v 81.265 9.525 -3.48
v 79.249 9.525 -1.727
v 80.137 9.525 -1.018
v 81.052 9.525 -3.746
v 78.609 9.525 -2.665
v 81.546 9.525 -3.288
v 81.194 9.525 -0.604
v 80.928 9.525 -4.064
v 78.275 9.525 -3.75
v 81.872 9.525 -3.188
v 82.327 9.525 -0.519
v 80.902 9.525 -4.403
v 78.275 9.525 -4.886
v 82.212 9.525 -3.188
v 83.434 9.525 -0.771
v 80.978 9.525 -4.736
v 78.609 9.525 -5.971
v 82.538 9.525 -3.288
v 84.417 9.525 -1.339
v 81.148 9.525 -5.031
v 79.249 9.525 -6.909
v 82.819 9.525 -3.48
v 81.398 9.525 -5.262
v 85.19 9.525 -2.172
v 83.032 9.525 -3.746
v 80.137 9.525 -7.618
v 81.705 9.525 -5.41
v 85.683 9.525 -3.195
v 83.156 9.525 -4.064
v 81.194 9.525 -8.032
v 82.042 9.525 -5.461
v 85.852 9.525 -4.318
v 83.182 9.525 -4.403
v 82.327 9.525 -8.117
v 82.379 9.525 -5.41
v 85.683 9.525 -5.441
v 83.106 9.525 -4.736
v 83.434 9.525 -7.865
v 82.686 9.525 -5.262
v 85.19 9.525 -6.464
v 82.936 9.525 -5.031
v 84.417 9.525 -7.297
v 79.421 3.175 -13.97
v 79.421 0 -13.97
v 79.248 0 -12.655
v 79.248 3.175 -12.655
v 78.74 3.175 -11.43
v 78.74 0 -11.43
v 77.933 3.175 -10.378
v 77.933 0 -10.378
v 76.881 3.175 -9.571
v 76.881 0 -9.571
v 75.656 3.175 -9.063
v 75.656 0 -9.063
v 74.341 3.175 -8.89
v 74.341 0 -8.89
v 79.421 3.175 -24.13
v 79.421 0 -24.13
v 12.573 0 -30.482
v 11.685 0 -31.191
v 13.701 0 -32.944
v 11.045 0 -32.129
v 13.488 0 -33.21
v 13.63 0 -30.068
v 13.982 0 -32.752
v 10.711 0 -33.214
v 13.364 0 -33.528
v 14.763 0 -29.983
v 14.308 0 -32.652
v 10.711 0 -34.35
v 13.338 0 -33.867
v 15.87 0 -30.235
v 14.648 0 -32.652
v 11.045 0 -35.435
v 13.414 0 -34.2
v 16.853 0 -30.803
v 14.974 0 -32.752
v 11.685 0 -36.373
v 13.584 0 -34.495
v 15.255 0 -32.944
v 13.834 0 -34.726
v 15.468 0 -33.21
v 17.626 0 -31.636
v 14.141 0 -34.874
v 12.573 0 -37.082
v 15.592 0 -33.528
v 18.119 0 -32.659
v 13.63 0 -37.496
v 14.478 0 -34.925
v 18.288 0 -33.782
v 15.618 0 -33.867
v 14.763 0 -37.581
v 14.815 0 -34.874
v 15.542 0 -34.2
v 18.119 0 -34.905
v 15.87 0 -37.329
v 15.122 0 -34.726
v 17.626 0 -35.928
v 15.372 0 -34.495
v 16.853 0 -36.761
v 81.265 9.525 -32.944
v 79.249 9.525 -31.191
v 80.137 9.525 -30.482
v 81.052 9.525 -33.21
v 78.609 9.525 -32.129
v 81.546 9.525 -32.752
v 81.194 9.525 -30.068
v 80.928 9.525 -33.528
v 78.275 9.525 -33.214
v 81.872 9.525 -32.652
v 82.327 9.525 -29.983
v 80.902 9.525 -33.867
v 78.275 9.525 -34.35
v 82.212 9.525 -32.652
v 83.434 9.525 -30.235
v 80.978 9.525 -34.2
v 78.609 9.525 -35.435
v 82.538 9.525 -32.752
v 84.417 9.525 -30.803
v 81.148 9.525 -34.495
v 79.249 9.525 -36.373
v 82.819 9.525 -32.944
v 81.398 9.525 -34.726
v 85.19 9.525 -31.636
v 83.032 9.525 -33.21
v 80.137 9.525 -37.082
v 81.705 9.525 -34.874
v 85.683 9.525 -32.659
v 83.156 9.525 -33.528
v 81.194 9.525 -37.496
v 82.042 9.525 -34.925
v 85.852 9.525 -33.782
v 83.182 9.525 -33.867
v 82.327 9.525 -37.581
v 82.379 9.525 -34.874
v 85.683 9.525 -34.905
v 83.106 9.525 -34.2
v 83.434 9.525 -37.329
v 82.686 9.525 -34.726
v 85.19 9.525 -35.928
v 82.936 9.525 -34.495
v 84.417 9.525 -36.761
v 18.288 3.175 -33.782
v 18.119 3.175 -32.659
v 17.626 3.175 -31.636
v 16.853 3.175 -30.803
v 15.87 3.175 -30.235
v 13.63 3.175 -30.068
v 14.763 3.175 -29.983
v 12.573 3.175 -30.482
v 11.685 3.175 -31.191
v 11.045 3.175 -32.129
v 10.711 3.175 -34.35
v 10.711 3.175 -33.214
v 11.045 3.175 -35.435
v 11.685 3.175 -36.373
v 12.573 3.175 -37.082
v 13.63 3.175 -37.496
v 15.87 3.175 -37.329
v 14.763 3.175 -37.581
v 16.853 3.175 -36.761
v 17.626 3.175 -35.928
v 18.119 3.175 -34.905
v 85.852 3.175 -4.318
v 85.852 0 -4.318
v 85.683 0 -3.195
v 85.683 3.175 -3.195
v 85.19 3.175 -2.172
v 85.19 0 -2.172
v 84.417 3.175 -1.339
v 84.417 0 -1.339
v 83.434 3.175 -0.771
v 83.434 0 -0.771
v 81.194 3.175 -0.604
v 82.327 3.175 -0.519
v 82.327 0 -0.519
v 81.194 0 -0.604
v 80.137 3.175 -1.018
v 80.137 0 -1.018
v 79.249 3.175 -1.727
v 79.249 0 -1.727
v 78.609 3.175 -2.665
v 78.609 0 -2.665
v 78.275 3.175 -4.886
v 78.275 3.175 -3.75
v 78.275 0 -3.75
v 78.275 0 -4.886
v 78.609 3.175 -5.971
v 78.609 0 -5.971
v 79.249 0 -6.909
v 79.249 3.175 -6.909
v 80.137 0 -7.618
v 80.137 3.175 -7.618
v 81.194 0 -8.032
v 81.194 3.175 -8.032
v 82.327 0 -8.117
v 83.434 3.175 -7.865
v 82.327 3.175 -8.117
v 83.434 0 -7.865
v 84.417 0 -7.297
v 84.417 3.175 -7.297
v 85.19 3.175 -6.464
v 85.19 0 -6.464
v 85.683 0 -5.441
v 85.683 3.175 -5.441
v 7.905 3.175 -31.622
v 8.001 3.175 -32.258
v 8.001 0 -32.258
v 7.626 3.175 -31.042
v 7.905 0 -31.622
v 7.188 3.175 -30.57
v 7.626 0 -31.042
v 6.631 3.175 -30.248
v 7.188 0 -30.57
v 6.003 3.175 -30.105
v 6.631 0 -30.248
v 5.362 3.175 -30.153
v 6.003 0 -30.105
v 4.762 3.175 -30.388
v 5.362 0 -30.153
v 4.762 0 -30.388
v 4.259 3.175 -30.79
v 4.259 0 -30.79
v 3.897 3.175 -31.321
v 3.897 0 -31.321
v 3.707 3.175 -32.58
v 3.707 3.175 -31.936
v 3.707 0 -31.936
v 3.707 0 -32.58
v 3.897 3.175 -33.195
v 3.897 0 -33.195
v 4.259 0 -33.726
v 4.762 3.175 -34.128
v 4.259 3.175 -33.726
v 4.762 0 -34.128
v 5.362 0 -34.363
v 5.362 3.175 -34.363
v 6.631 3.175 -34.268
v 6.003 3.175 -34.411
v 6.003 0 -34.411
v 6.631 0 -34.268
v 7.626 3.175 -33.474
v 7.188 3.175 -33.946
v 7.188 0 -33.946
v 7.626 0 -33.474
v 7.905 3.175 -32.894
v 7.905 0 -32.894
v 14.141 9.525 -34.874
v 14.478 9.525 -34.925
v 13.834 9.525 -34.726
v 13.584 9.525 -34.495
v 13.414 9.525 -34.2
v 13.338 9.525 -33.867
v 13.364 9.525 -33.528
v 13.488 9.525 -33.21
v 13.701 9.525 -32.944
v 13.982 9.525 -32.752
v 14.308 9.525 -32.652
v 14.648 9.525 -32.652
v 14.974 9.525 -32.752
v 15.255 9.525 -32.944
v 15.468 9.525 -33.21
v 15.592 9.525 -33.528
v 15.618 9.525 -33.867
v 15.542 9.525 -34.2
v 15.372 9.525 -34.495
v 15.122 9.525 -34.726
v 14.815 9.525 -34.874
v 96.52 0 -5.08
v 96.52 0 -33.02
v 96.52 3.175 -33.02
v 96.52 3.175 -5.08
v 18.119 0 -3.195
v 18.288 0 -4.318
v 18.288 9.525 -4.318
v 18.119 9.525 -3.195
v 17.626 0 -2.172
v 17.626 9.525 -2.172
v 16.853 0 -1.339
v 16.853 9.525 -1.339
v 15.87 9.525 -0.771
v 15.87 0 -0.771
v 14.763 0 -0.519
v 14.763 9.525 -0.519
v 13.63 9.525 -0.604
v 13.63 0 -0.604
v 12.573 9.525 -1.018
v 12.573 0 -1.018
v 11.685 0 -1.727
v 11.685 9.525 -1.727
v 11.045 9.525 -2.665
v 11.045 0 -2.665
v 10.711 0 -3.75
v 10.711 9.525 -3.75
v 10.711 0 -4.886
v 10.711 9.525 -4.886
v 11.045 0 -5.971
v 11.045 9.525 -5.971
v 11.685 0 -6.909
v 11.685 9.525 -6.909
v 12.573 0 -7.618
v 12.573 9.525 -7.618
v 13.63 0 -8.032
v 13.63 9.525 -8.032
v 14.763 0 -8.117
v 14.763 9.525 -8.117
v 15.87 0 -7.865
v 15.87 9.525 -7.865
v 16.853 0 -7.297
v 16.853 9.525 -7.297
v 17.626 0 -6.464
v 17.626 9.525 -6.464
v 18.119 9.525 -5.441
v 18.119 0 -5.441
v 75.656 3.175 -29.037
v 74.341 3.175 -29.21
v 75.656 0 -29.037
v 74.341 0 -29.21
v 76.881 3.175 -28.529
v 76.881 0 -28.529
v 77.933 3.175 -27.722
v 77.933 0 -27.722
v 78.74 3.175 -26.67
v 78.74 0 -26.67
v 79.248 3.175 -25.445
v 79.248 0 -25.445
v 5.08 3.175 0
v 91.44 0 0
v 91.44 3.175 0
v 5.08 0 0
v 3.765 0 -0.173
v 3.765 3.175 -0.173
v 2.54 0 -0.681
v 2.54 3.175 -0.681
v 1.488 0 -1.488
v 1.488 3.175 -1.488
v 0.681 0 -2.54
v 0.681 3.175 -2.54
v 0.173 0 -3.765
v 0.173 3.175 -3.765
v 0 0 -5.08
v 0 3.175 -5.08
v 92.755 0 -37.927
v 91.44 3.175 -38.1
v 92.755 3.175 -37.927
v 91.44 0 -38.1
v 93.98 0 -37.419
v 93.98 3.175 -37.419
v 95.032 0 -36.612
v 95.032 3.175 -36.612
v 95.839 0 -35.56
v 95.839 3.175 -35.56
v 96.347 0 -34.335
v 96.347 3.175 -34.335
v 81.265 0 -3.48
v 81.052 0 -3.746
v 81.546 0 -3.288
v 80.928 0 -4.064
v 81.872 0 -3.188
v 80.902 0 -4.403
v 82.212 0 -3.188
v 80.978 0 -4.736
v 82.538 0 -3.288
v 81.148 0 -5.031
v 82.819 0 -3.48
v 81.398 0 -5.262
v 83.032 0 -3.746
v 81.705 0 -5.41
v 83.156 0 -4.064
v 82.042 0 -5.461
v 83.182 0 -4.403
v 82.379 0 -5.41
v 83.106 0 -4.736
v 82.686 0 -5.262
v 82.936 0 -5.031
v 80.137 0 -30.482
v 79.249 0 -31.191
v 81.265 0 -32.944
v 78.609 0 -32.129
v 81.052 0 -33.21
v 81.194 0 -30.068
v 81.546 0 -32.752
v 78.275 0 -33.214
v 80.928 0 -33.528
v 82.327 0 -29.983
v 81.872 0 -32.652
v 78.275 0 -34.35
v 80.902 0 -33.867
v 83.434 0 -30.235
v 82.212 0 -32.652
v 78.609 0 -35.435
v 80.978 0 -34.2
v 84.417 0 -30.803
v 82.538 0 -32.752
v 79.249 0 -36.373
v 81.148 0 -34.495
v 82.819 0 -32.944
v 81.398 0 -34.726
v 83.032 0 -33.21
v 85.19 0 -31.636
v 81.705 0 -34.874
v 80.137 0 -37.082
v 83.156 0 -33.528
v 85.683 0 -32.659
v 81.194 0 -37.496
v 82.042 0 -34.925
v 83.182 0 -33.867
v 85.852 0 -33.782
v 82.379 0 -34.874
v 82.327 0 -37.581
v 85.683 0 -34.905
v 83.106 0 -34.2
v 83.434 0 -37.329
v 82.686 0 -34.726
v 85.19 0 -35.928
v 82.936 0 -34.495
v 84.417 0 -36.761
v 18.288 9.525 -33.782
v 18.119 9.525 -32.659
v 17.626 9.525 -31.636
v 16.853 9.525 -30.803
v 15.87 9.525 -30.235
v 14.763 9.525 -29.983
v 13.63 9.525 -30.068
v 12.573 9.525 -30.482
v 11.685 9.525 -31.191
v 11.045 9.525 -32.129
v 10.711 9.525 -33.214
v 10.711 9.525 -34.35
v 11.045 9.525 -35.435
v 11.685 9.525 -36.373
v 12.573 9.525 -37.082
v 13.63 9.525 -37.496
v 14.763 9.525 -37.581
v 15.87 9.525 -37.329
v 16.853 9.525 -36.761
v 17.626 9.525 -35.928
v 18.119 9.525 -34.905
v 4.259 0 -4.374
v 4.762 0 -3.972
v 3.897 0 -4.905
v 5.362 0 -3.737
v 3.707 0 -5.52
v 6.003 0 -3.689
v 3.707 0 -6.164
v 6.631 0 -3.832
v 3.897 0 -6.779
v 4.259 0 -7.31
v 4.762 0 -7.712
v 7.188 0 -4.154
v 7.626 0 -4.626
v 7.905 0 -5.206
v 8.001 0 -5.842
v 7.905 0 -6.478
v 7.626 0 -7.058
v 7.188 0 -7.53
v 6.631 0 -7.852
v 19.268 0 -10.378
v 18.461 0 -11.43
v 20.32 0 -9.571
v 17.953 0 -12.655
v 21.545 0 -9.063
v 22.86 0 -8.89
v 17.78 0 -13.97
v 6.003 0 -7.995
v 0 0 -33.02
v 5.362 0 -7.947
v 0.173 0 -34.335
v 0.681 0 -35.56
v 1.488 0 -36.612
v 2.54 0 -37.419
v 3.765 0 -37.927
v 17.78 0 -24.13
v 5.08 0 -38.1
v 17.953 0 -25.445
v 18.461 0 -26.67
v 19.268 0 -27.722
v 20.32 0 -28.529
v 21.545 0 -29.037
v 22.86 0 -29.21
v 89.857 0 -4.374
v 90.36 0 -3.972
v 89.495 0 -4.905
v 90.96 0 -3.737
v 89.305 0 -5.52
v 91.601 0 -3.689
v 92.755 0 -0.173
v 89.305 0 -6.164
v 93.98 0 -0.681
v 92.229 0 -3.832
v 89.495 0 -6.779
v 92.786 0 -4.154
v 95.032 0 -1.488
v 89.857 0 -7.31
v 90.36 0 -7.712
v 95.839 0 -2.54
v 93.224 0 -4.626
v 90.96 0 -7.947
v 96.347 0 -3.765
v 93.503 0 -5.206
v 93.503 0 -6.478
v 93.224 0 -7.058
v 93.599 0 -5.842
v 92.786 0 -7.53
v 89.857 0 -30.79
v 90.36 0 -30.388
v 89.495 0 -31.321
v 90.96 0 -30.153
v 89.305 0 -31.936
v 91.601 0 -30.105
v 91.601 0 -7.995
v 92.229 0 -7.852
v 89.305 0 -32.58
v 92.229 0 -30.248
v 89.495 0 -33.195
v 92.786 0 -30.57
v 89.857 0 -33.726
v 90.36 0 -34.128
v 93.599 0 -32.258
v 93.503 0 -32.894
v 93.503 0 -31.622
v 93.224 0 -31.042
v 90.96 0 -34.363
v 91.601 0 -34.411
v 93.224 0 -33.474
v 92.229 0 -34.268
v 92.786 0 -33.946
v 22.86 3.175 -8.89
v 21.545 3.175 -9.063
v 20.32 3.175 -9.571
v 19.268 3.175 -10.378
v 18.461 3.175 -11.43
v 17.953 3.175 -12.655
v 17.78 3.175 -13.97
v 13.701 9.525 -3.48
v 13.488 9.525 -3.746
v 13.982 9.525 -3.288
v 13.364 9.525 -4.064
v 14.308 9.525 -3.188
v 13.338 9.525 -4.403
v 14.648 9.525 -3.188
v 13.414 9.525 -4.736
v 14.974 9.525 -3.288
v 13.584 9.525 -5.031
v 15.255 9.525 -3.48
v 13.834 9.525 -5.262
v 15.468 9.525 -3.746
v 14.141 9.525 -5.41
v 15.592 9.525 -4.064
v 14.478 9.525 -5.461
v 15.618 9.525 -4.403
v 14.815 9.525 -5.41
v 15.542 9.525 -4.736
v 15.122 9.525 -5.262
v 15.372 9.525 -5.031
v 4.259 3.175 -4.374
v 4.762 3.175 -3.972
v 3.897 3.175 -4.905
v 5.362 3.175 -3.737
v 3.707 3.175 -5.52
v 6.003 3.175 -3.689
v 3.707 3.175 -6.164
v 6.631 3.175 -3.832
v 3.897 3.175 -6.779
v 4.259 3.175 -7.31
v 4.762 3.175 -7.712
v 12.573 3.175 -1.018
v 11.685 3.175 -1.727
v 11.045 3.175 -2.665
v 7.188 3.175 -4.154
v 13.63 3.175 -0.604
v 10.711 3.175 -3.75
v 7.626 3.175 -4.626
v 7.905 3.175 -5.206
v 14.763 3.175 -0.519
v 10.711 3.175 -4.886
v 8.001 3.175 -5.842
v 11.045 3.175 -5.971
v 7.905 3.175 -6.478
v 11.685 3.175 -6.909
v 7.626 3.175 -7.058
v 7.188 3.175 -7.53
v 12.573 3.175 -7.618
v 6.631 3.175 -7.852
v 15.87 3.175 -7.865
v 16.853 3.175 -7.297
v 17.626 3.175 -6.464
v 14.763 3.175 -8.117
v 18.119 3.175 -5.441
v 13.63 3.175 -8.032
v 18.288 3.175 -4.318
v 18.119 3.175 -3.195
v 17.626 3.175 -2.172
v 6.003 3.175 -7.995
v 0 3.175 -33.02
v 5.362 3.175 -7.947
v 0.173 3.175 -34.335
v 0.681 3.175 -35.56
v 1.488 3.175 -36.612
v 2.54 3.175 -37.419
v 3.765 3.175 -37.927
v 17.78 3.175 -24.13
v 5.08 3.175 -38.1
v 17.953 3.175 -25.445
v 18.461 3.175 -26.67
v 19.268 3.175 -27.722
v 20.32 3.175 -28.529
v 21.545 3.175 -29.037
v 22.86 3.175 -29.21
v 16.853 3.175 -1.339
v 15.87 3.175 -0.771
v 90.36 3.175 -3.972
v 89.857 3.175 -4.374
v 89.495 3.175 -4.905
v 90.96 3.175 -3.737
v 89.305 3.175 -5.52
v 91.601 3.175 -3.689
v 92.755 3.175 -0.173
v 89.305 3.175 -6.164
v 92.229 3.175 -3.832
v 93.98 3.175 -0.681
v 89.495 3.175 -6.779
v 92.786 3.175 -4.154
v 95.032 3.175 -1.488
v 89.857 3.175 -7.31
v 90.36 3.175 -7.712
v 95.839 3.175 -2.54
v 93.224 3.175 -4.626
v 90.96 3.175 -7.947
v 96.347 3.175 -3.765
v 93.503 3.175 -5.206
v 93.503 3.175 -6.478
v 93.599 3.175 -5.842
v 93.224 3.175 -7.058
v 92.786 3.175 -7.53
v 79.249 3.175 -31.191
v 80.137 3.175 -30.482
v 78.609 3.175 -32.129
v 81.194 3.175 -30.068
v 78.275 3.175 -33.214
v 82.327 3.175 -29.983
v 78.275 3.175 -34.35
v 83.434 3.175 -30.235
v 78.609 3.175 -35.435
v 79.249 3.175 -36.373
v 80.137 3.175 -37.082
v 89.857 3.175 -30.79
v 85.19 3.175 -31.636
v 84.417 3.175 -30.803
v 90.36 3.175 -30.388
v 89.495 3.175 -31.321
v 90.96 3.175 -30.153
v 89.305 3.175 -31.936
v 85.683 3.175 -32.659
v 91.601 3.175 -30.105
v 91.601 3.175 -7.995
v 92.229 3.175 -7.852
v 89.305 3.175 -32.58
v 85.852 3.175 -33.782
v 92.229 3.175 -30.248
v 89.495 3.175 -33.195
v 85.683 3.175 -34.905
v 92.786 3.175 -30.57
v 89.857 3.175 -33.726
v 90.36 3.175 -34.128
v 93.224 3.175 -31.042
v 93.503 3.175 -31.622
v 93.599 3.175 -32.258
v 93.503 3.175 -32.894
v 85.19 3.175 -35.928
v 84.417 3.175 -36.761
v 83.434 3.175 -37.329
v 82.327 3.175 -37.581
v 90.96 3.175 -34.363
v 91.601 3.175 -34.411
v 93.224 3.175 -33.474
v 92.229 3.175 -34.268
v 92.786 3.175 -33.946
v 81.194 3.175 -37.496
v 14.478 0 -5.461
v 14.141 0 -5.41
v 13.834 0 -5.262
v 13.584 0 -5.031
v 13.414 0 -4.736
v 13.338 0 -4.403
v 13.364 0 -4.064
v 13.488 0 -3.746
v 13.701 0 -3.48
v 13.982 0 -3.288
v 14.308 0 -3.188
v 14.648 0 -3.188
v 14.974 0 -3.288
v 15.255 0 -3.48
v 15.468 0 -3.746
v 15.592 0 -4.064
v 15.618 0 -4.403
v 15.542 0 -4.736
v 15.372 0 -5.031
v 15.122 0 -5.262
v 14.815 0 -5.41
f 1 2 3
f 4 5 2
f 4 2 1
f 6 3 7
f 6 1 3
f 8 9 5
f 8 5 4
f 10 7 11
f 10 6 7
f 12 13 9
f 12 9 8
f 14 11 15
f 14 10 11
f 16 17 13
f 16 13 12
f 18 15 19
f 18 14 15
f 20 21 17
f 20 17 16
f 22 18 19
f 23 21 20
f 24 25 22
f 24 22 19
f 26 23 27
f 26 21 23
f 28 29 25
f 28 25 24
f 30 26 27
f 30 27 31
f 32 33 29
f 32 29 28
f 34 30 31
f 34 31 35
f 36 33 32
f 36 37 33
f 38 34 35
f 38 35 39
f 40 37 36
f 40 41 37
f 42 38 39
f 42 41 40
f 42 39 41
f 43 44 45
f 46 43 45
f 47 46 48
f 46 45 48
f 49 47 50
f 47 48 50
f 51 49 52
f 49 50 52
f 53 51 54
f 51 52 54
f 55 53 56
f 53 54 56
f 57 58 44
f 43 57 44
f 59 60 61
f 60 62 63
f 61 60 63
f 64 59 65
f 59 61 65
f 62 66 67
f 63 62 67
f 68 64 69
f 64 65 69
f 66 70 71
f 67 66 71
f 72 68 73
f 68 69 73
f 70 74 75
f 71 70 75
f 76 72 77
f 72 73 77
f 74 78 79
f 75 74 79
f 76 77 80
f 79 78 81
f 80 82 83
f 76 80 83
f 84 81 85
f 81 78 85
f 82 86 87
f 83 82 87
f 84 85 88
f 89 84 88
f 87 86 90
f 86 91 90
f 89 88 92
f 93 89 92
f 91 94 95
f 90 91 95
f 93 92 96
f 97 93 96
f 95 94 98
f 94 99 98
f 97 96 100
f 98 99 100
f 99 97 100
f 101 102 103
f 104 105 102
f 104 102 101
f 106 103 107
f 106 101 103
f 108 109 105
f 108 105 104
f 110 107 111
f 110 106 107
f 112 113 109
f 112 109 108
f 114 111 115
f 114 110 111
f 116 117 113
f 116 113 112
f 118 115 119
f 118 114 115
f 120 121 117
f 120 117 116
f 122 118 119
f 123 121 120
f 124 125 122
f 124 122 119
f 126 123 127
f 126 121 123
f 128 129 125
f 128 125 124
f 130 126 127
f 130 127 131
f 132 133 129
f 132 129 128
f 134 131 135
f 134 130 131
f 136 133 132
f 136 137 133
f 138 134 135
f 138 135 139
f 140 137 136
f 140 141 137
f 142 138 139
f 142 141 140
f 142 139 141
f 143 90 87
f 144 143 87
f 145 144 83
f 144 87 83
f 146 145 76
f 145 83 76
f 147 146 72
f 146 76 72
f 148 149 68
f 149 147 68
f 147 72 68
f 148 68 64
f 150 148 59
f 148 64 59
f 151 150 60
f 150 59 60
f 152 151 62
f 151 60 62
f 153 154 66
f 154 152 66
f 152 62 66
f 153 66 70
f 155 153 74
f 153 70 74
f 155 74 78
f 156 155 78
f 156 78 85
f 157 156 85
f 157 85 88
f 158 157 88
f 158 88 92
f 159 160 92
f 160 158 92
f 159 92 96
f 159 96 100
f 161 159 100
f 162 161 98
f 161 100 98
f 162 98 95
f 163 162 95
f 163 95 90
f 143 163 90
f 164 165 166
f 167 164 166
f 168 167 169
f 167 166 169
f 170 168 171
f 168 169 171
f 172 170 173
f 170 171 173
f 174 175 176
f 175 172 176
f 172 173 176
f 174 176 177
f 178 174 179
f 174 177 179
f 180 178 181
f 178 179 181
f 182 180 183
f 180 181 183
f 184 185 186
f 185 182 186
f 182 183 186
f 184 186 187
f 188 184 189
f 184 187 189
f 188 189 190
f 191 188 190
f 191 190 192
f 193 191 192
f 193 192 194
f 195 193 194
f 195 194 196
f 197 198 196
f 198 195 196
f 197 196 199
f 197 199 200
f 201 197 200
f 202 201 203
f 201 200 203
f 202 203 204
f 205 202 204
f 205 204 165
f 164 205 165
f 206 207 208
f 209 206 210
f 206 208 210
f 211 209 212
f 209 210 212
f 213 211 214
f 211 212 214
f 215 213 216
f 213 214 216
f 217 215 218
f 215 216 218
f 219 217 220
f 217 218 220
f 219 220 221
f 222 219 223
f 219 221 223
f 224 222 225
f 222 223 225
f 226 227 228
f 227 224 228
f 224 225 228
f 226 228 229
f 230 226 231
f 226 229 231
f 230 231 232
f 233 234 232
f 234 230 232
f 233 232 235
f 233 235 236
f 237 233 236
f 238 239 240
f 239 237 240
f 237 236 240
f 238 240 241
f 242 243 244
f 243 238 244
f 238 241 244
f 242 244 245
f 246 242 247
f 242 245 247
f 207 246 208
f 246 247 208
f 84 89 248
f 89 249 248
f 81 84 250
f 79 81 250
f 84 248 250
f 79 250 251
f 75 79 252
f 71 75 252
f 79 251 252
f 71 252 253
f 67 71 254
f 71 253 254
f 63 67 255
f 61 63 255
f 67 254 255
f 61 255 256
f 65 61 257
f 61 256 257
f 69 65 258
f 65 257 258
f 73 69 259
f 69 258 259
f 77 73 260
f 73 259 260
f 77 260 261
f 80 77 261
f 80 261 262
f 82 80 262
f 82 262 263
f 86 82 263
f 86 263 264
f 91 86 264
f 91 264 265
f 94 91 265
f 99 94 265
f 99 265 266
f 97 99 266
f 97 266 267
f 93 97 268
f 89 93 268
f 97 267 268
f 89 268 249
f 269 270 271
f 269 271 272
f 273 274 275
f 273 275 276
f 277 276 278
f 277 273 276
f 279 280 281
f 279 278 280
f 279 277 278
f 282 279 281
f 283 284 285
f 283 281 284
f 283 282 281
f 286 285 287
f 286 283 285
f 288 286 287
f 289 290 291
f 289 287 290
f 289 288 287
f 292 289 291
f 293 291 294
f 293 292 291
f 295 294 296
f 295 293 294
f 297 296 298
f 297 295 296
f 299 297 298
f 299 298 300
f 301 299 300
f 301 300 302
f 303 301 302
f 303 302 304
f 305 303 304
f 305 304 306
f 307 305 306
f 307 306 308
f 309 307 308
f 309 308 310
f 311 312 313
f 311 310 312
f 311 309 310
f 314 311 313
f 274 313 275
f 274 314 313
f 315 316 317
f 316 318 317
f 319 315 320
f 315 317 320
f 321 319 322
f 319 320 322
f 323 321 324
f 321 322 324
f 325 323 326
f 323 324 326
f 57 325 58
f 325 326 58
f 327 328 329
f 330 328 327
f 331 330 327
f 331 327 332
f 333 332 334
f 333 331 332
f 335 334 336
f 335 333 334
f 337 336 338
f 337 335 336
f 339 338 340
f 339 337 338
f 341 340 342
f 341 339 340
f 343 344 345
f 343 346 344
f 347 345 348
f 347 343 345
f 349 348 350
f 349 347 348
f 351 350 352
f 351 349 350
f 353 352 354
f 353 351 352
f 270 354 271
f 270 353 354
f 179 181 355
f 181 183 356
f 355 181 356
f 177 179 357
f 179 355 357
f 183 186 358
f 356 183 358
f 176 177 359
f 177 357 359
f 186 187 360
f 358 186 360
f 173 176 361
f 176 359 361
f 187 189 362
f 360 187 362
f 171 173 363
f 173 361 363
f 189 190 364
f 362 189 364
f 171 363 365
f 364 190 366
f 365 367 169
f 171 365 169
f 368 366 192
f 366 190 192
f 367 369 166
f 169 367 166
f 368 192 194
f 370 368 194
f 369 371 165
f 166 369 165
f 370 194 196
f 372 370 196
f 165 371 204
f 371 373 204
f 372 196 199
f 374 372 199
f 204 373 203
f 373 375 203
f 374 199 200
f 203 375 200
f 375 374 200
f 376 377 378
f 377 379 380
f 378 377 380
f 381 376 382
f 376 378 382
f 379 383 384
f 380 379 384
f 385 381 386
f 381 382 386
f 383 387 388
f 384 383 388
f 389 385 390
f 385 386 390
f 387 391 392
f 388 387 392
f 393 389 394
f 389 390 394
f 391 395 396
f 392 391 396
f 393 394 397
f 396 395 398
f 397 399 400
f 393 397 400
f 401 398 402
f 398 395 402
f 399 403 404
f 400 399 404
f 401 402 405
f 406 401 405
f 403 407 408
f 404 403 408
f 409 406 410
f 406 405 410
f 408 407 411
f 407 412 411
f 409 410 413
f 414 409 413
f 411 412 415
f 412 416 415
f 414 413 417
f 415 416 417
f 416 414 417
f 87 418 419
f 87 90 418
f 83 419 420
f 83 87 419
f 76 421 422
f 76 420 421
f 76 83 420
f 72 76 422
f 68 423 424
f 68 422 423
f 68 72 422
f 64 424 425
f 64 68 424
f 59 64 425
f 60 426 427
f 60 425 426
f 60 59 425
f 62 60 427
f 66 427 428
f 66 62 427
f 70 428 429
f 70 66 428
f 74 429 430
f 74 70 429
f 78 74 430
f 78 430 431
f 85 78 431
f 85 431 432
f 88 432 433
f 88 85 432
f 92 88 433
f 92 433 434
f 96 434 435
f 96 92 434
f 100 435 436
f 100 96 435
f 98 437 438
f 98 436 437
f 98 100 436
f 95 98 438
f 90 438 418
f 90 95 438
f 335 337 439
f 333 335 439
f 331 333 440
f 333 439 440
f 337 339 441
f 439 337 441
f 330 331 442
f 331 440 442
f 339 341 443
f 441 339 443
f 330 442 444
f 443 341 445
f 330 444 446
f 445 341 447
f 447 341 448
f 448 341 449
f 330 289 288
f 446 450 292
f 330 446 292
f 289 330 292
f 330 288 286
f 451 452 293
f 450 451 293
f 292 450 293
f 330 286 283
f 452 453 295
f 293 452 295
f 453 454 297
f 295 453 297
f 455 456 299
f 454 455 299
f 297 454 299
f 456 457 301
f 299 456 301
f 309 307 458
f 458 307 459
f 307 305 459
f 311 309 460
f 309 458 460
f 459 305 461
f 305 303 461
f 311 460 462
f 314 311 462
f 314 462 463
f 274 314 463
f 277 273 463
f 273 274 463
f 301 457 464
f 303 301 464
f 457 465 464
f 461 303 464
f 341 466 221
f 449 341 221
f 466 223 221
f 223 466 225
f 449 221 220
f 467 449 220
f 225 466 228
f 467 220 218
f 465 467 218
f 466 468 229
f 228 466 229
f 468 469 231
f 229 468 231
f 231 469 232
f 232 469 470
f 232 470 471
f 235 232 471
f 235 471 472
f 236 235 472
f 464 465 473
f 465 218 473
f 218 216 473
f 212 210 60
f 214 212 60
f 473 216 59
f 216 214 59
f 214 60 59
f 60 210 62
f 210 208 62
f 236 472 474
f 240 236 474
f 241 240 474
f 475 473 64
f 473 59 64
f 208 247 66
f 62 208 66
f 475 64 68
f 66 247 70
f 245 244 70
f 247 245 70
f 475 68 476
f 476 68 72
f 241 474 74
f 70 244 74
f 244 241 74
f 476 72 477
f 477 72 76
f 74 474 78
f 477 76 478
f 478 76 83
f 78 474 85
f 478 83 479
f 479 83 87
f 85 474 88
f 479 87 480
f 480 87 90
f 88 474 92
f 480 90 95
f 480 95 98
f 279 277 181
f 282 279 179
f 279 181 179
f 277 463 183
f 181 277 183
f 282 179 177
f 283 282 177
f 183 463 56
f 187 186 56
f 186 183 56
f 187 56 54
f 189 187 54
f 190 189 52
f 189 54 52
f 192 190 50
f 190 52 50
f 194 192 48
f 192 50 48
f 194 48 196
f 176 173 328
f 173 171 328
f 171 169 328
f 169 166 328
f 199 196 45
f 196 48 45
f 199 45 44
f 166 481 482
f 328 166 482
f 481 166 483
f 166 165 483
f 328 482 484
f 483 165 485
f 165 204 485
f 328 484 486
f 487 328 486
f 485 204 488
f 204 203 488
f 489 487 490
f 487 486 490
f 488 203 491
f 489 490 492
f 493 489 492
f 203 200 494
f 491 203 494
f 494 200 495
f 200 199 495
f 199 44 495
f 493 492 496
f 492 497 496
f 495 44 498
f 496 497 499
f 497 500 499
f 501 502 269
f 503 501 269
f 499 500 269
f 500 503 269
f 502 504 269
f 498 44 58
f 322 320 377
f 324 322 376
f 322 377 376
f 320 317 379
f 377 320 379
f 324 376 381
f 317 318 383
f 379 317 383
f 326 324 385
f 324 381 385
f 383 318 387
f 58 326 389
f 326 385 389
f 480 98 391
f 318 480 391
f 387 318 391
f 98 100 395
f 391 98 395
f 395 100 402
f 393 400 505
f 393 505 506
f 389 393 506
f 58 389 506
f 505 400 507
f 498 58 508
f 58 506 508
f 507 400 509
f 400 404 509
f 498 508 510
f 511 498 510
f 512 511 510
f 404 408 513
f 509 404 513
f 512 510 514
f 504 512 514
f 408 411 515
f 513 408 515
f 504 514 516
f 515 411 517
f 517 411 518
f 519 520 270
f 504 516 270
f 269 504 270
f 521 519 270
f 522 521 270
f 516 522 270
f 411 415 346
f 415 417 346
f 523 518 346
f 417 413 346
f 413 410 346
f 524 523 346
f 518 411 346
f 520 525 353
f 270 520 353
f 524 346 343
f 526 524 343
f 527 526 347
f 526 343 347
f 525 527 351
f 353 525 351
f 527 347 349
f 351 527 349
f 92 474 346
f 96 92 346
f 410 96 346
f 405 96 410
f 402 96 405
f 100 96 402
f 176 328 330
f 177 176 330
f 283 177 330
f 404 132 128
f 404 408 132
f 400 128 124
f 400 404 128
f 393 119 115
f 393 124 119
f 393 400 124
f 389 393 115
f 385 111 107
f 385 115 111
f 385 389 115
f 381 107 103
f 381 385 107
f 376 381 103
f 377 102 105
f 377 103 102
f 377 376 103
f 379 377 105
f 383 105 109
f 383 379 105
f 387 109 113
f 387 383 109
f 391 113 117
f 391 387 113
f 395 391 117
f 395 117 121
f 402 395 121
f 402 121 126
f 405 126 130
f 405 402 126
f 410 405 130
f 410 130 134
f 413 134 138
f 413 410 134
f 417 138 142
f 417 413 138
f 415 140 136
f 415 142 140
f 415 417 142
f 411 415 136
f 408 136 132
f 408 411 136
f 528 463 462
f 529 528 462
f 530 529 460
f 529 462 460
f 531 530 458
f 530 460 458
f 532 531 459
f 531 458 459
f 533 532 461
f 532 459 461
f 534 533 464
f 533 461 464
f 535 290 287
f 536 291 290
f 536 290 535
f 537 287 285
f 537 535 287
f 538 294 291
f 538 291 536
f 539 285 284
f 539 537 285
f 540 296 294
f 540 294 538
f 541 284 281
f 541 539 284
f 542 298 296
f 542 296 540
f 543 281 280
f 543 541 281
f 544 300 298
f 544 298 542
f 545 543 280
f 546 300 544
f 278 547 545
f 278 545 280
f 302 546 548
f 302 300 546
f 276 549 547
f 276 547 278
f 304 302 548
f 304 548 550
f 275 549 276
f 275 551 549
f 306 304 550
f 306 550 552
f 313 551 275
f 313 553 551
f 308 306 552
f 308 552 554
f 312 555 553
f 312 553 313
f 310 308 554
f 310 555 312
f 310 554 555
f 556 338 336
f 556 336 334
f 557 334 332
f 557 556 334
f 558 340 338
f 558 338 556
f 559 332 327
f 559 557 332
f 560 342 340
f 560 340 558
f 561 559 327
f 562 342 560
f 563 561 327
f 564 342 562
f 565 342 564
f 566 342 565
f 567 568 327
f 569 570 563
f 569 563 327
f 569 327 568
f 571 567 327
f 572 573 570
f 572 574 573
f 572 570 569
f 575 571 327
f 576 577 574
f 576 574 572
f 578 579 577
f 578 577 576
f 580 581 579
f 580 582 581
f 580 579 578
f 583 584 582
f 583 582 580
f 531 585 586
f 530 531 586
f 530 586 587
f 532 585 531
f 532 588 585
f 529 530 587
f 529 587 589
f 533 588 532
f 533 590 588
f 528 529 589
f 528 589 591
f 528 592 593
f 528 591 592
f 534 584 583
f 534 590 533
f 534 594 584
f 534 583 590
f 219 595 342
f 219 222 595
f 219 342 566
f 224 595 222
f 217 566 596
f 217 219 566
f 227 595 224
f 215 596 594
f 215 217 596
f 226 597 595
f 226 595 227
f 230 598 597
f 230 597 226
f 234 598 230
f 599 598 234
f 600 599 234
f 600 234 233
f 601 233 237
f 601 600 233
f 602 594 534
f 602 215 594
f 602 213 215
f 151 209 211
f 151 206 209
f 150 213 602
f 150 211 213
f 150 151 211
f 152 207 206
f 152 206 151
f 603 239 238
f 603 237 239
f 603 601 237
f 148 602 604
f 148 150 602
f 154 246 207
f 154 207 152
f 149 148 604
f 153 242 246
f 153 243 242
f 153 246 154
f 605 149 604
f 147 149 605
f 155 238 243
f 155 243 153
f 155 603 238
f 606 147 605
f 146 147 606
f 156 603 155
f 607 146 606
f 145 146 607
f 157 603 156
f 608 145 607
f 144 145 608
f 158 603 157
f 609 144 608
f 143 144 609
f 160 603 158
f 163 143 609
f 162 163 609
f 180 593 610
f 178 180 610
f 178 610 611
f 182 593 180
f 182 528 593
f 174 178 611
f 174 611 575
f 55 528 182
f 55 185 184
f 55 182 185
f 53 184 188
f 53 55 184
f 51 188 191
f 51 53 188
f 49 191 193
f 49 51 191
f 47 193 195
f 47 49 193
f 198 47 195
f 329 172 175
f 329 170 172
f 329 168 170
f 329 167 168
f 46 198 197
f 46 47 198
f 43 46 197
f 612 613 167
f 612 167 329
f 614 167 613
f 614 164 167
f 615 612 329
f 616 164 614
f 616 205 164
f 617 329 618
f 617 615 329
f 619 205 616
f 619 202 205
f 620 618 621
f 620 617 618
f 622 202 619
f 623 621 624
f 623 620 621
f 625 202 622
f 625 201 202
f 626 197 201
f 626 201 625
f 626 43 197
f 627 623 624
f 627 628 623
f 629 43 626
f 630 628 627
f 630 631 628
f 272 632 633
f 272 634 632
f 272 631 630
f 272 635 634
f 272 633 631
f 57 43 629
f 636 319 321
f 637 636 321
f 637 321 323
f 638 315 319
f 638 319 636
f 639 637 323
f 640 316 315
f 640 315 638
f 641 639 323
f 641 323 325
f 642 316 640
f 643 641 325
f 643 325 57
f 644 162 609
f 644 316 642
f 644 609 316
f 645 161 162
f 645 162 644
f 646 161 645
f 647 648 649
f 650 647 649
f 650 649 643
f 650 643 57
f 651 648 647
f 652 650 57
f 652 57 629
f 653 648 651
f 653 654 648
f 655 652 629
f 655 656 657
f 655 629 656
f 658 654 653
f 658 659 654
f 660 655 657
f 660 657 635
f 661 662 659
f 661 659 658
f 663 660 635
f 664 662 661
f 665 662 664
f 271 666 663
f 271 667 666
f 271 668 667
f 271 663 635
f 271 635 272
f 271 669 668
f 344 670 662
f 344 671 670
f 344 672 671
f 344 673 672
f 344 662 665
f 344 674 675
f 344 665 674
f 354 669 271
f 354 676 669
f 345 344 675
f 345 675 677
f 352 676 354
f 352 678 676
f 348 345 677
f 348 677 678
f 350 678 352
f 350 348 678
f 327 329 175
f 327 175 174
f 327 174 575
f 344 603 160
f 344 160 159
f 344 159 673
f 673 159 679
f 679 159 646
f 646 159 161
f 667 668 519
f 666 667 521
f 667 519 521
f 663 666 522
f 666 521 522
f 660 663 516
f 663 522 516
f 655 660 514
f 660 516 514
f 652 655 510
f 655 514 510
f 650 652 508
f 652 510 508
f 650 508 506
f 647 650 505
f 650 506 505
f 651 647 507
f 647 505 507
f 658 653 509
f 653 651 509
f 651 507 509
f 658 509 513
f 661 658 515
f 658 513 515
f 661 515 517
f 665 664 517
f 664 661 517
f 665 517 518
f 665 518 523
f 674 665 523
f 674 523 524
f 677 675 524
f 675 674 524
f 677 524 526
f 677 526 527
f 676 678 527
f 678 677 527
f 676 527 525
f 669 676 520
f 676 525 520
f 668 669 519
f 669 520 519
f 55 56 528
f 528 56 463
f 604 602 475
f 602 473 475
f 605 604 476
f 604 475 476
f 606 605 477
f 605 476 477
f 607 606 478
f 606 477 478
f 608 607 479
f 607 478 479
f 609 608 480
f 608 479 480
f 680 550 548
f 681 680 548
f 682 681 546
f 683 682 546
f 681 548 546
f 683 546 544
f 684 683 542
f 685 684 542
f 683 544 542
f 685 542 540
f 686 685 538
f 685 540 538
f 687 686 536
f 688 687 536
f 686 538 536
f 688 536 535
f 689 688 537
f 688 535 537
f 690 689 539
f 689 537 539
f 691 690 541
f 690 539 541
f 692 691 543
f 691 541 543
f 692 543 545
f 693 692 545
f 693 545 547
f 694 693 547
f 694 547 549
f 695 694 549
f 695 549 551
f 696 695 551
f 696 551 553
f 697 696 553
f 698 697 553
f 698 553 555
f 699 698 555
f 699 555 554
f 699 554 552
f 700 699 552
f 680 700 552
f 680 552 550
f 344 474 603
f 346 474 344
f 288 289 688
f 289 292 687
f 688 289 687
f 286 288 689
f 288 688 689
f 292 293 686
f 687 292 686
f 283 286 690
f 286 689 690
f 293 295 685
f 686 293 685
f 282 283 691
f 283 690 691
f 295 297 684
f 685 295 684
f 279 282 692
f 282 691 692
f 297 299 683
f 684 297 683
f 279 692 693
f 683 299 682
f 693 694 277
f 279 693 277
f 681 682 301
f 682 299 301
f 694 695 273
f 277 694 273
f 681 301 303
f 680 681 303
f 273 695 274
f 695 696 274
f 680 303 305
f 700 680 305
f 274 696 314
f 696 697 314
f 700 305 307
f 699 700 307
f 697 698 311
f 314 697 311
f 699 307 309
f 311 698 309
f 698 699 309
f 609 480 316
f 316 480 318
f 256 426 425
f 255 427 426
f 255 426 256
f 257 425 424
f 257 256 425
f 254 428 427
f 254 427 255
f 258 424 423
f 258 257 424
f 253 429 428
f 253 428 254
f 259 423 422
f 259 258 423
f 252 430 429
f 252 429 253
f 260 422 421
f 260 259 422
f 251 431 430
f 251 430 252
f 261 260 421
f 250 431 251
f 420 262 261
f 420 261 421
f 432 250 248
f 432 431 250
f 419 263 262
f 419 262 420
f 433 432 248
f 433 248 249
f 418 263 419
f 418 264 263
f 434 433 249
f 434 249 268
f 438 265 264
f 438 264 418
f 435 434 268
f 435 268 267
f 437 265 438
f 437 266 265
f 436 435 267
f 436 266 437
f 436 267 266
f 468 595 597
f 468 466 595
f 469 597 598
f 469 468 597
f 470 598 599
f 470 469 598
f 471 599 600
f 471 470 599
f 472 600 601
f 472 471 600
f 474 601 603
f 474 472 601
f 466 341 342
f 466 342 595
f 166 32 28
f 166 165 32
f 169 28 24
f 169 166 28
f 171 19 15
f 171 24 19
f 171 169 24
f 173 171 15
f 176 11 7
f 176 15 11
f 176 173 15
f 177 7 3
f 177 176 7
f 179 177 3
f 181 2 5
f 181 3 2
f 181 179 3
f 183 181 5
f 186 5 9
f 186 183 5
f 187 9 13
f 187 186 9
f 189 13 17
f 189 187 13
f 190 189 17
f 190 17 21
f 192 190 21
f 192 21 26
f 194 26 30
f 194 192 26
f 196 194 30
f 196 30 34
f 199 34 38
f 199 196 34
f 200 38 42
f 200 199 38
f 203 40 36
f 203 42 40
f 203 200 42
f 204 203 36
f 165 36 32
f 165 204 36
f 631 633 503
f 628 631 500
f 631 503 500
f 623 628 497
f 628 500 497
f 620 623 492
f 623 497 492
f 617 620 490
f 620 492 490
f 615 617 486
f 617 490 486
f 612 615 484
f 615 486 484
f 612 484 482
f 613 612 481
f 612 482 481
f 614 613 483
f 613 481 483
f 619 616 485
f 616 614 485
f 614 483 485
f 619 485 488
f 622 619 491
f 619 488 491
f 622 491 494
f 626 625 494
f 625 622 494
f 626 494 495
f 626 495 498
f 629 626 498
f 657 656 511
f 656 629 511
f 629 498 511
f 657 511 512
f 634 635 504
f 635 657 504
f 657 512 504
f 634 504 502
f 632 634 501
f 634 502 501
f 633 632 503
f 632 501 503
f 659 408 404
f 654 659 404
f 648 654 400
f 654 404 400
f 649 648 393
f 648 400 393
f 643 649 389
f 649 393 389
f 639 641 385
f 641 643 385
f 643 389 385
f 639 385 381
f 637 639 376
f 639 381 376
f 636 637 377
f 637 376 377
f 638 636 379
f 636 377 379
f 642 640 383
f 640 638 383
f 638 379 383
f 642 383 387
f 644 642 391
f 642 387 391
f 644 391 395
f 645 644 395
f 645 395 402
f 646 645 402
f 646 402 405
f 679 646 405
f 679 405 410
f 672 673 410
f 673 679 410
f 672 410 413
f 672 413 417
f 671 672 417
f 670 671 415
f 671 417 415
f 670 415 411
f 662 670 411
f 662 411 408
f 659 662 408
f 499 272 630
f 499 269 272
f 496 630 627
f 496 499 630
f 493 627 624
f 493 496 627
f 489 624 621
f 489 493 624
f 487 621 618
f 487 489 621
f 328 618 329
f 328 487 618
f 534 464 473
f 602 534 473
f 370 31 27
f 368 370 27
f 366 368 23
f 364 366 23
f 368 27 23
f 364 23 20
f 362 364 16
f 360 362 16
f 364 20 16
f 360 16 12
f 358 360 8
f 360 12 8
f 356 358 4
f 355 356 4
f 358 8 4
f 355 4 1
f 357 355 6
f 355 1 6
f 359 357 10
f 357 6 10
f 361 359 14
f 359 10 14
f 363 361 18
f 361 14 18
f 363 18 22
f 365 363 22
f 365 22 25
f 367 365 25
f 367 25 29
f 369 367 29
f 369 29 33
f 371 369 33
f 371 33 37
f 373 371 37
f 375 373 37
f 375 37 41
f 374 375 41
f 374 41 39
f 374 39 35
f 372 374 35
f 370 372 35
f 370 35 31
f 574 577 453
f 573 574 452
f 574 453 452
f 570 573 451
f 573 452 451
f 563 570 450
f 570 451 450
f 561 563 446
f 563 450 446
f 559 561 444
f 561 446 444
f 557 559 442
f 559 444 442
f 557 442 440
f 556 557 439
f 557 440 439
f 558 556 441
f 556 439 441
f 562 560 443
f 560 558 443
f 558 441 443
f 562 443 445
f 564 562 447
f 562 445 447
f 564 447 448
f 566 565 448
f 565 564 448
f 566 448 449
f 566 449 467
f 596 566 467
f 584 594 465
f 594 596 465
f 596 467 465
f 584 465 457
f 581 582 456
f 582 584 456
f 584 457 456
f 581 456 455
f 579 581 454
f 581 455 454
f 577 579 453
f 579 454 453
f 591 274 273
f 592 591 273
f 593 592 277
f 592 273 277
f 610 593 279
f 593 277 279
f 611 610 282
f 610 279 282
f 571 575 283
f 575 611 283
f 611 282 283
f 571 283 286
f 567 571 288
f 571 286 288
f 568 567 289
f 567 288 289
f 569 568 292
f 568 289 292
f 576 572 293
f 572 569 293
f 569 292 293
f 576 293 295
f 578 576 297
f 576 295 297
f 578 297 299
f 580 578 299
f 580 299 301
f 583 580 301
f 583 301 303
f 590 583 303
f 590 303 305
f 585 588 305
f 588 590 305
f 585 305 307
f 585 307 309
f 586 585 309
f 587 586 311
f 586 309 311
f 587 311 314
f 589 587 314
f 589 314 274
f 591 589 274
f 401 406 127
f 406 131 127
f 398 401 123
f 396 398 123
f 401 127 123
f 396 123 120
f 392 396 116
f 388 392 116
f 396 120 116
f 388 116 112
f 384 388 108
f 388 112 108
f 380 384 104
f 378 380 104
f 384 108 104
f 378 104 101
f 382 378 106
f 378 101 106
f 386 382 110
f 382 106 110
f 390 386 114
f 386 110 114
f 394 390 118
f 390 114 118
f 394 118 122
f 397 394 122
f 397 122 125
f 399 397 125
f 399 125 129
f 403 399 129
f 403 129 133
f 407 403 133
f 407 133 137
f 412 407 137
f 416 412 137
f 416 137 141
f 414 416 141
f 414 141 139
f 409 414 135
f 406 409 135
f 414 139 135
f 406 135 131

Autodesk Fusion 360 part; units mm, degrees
sketch "Sketch1" plane through (0, 0, 0) normal (0, 1, 0) x (1, 0, 0)
  circle A0 centre (14.478, 4.318) radius 3.81
  circle A1 centre (14.478, 33.782) radius 3.81
  circle A2 centre (14.478, 33.782) radius 1.143
  circle A3 centre (91.44, 5.842) radius 2.159
  circle A4 centre (82.042, 4.318) radius 3.81
  circle A5 centre (5.842, 32.258) radius 2.159
  circle A6 centre (14.478, 4.318) radius 1.143
  circle A7 centre (82.042, 33.782) radius 3.81
  circle A8 centre (5.842, 5.842) radius 2.159
  circle A9 centre (82.042, 33.782) radius 1.143
  circle A10 centre (82.042, 4.318) radius 1.143
  circle A11 centre (91.44, 32.258) radius 2.159
  line L0 (5.08, 38.1) -> (91.44, 38.1)
  line L1 (96.52, 33.02) -> (96.52, 5.08)
  line L2 (91.44, 0) -> (5.08, 0)
  line L3 (0, 5.08) -> (0, 33.02)
  arc A12 (5.08, 38.1) -> (0, 33.02) centre (5.08, 33.02) ccw
  arc A13 (0, 5.08) -> (5.08, 0) centre (5.08, 5.08) ccw
  arc A14 (96.52, 33.02) -> (91.44, 38.1) centre (91.44, 33.02) ccw
  arc A15 (91.44, 0) -> (96.52, 5.08) centre (91.44, 5.08) ccw
  line L4 (22.86, 29.21) -> (74.3407, 29.21)
  line L5 (79.4207, 24.13) -> (79.4207, 13.97)
  line L6 (74.3407, 8.89) -> (22.86, 8.89)
  line L7 (17.78, 13.97) -> (17.78, 24.13)
  arc A16 (22.86, 29.21) -> (17.78, 24.13) centre (22.86, 24.13) ccw
  arc A17 (17.78, 13.97) -> (22.86, 8.89) centre (22.86, 13.97) ccw
  arc A18 (74.3407, 8.89) -> (79.4207, 13.97) centre (74.3407, 13.97) ccw
  arc A19 (79.4207, 24.13) -> (74.3407, 29.21) centre (74.3407, 24.13) ccw
  point P0 (0, 38.1)
  point P1 (96.52, 38.1)
  point P2 (96.52, 0)
  point P3 (96.52, 0.0007)
  dimension "d12" = 8.636
  dimension "d13" = 8.636
  dimension "d16" = 67.564
  dimension "d17" = 67.564
  dimension "d18" = 29.464
  dimension "d20" = 96.52
  dimension "d21" = 38.1
  dimension "d22" = 5.08
  dimension "d23" = 5.08
  dimension "d24" = 5.08
  dimension "d25" = 5.08
  dimension "d26" = 5.08
  dimension "d27" = 5.08
extrude "Extrude1" add sketch "Sketch1" along normal blind 3.175 contours L0 L1 L2 L3 A12 A13 A14 A15 makes body 1
extrude "Extrude2" add sketch "Sketch1" along normal blind 9.525 separate body contours A0 | A1 | A2 | A4 | A6 | A7 | A9 | A10 makes body 2 at (18.2833, 6.35, -4.1281) makes body 3 at (85.8473, 6.35, -33.5921) makes body 4 at (18.2833, 6.35, -33.5921) makes body 5 at (85.8473, 6.35, -4.1281)
hole "Hole1" at (5.842, 0, -5.842) at (5.842, 0, -32.258) at (91.44, 0, -5.842) at (91.44, 0, -32.258) direction (0, -1, 0) diameter 4.318 depth 2.54 tip angle 118 bodies 1
hole "Hole2" at (14.478, 0, -4.318) at (14.478, 0, -33.782) at (82.042, 0, -33.782) at (82.042, 0, -4.318) direction (0, 1, 0) diameter 2.286 depth 9.525 tip angle 180 bodies 2 3 4 5
